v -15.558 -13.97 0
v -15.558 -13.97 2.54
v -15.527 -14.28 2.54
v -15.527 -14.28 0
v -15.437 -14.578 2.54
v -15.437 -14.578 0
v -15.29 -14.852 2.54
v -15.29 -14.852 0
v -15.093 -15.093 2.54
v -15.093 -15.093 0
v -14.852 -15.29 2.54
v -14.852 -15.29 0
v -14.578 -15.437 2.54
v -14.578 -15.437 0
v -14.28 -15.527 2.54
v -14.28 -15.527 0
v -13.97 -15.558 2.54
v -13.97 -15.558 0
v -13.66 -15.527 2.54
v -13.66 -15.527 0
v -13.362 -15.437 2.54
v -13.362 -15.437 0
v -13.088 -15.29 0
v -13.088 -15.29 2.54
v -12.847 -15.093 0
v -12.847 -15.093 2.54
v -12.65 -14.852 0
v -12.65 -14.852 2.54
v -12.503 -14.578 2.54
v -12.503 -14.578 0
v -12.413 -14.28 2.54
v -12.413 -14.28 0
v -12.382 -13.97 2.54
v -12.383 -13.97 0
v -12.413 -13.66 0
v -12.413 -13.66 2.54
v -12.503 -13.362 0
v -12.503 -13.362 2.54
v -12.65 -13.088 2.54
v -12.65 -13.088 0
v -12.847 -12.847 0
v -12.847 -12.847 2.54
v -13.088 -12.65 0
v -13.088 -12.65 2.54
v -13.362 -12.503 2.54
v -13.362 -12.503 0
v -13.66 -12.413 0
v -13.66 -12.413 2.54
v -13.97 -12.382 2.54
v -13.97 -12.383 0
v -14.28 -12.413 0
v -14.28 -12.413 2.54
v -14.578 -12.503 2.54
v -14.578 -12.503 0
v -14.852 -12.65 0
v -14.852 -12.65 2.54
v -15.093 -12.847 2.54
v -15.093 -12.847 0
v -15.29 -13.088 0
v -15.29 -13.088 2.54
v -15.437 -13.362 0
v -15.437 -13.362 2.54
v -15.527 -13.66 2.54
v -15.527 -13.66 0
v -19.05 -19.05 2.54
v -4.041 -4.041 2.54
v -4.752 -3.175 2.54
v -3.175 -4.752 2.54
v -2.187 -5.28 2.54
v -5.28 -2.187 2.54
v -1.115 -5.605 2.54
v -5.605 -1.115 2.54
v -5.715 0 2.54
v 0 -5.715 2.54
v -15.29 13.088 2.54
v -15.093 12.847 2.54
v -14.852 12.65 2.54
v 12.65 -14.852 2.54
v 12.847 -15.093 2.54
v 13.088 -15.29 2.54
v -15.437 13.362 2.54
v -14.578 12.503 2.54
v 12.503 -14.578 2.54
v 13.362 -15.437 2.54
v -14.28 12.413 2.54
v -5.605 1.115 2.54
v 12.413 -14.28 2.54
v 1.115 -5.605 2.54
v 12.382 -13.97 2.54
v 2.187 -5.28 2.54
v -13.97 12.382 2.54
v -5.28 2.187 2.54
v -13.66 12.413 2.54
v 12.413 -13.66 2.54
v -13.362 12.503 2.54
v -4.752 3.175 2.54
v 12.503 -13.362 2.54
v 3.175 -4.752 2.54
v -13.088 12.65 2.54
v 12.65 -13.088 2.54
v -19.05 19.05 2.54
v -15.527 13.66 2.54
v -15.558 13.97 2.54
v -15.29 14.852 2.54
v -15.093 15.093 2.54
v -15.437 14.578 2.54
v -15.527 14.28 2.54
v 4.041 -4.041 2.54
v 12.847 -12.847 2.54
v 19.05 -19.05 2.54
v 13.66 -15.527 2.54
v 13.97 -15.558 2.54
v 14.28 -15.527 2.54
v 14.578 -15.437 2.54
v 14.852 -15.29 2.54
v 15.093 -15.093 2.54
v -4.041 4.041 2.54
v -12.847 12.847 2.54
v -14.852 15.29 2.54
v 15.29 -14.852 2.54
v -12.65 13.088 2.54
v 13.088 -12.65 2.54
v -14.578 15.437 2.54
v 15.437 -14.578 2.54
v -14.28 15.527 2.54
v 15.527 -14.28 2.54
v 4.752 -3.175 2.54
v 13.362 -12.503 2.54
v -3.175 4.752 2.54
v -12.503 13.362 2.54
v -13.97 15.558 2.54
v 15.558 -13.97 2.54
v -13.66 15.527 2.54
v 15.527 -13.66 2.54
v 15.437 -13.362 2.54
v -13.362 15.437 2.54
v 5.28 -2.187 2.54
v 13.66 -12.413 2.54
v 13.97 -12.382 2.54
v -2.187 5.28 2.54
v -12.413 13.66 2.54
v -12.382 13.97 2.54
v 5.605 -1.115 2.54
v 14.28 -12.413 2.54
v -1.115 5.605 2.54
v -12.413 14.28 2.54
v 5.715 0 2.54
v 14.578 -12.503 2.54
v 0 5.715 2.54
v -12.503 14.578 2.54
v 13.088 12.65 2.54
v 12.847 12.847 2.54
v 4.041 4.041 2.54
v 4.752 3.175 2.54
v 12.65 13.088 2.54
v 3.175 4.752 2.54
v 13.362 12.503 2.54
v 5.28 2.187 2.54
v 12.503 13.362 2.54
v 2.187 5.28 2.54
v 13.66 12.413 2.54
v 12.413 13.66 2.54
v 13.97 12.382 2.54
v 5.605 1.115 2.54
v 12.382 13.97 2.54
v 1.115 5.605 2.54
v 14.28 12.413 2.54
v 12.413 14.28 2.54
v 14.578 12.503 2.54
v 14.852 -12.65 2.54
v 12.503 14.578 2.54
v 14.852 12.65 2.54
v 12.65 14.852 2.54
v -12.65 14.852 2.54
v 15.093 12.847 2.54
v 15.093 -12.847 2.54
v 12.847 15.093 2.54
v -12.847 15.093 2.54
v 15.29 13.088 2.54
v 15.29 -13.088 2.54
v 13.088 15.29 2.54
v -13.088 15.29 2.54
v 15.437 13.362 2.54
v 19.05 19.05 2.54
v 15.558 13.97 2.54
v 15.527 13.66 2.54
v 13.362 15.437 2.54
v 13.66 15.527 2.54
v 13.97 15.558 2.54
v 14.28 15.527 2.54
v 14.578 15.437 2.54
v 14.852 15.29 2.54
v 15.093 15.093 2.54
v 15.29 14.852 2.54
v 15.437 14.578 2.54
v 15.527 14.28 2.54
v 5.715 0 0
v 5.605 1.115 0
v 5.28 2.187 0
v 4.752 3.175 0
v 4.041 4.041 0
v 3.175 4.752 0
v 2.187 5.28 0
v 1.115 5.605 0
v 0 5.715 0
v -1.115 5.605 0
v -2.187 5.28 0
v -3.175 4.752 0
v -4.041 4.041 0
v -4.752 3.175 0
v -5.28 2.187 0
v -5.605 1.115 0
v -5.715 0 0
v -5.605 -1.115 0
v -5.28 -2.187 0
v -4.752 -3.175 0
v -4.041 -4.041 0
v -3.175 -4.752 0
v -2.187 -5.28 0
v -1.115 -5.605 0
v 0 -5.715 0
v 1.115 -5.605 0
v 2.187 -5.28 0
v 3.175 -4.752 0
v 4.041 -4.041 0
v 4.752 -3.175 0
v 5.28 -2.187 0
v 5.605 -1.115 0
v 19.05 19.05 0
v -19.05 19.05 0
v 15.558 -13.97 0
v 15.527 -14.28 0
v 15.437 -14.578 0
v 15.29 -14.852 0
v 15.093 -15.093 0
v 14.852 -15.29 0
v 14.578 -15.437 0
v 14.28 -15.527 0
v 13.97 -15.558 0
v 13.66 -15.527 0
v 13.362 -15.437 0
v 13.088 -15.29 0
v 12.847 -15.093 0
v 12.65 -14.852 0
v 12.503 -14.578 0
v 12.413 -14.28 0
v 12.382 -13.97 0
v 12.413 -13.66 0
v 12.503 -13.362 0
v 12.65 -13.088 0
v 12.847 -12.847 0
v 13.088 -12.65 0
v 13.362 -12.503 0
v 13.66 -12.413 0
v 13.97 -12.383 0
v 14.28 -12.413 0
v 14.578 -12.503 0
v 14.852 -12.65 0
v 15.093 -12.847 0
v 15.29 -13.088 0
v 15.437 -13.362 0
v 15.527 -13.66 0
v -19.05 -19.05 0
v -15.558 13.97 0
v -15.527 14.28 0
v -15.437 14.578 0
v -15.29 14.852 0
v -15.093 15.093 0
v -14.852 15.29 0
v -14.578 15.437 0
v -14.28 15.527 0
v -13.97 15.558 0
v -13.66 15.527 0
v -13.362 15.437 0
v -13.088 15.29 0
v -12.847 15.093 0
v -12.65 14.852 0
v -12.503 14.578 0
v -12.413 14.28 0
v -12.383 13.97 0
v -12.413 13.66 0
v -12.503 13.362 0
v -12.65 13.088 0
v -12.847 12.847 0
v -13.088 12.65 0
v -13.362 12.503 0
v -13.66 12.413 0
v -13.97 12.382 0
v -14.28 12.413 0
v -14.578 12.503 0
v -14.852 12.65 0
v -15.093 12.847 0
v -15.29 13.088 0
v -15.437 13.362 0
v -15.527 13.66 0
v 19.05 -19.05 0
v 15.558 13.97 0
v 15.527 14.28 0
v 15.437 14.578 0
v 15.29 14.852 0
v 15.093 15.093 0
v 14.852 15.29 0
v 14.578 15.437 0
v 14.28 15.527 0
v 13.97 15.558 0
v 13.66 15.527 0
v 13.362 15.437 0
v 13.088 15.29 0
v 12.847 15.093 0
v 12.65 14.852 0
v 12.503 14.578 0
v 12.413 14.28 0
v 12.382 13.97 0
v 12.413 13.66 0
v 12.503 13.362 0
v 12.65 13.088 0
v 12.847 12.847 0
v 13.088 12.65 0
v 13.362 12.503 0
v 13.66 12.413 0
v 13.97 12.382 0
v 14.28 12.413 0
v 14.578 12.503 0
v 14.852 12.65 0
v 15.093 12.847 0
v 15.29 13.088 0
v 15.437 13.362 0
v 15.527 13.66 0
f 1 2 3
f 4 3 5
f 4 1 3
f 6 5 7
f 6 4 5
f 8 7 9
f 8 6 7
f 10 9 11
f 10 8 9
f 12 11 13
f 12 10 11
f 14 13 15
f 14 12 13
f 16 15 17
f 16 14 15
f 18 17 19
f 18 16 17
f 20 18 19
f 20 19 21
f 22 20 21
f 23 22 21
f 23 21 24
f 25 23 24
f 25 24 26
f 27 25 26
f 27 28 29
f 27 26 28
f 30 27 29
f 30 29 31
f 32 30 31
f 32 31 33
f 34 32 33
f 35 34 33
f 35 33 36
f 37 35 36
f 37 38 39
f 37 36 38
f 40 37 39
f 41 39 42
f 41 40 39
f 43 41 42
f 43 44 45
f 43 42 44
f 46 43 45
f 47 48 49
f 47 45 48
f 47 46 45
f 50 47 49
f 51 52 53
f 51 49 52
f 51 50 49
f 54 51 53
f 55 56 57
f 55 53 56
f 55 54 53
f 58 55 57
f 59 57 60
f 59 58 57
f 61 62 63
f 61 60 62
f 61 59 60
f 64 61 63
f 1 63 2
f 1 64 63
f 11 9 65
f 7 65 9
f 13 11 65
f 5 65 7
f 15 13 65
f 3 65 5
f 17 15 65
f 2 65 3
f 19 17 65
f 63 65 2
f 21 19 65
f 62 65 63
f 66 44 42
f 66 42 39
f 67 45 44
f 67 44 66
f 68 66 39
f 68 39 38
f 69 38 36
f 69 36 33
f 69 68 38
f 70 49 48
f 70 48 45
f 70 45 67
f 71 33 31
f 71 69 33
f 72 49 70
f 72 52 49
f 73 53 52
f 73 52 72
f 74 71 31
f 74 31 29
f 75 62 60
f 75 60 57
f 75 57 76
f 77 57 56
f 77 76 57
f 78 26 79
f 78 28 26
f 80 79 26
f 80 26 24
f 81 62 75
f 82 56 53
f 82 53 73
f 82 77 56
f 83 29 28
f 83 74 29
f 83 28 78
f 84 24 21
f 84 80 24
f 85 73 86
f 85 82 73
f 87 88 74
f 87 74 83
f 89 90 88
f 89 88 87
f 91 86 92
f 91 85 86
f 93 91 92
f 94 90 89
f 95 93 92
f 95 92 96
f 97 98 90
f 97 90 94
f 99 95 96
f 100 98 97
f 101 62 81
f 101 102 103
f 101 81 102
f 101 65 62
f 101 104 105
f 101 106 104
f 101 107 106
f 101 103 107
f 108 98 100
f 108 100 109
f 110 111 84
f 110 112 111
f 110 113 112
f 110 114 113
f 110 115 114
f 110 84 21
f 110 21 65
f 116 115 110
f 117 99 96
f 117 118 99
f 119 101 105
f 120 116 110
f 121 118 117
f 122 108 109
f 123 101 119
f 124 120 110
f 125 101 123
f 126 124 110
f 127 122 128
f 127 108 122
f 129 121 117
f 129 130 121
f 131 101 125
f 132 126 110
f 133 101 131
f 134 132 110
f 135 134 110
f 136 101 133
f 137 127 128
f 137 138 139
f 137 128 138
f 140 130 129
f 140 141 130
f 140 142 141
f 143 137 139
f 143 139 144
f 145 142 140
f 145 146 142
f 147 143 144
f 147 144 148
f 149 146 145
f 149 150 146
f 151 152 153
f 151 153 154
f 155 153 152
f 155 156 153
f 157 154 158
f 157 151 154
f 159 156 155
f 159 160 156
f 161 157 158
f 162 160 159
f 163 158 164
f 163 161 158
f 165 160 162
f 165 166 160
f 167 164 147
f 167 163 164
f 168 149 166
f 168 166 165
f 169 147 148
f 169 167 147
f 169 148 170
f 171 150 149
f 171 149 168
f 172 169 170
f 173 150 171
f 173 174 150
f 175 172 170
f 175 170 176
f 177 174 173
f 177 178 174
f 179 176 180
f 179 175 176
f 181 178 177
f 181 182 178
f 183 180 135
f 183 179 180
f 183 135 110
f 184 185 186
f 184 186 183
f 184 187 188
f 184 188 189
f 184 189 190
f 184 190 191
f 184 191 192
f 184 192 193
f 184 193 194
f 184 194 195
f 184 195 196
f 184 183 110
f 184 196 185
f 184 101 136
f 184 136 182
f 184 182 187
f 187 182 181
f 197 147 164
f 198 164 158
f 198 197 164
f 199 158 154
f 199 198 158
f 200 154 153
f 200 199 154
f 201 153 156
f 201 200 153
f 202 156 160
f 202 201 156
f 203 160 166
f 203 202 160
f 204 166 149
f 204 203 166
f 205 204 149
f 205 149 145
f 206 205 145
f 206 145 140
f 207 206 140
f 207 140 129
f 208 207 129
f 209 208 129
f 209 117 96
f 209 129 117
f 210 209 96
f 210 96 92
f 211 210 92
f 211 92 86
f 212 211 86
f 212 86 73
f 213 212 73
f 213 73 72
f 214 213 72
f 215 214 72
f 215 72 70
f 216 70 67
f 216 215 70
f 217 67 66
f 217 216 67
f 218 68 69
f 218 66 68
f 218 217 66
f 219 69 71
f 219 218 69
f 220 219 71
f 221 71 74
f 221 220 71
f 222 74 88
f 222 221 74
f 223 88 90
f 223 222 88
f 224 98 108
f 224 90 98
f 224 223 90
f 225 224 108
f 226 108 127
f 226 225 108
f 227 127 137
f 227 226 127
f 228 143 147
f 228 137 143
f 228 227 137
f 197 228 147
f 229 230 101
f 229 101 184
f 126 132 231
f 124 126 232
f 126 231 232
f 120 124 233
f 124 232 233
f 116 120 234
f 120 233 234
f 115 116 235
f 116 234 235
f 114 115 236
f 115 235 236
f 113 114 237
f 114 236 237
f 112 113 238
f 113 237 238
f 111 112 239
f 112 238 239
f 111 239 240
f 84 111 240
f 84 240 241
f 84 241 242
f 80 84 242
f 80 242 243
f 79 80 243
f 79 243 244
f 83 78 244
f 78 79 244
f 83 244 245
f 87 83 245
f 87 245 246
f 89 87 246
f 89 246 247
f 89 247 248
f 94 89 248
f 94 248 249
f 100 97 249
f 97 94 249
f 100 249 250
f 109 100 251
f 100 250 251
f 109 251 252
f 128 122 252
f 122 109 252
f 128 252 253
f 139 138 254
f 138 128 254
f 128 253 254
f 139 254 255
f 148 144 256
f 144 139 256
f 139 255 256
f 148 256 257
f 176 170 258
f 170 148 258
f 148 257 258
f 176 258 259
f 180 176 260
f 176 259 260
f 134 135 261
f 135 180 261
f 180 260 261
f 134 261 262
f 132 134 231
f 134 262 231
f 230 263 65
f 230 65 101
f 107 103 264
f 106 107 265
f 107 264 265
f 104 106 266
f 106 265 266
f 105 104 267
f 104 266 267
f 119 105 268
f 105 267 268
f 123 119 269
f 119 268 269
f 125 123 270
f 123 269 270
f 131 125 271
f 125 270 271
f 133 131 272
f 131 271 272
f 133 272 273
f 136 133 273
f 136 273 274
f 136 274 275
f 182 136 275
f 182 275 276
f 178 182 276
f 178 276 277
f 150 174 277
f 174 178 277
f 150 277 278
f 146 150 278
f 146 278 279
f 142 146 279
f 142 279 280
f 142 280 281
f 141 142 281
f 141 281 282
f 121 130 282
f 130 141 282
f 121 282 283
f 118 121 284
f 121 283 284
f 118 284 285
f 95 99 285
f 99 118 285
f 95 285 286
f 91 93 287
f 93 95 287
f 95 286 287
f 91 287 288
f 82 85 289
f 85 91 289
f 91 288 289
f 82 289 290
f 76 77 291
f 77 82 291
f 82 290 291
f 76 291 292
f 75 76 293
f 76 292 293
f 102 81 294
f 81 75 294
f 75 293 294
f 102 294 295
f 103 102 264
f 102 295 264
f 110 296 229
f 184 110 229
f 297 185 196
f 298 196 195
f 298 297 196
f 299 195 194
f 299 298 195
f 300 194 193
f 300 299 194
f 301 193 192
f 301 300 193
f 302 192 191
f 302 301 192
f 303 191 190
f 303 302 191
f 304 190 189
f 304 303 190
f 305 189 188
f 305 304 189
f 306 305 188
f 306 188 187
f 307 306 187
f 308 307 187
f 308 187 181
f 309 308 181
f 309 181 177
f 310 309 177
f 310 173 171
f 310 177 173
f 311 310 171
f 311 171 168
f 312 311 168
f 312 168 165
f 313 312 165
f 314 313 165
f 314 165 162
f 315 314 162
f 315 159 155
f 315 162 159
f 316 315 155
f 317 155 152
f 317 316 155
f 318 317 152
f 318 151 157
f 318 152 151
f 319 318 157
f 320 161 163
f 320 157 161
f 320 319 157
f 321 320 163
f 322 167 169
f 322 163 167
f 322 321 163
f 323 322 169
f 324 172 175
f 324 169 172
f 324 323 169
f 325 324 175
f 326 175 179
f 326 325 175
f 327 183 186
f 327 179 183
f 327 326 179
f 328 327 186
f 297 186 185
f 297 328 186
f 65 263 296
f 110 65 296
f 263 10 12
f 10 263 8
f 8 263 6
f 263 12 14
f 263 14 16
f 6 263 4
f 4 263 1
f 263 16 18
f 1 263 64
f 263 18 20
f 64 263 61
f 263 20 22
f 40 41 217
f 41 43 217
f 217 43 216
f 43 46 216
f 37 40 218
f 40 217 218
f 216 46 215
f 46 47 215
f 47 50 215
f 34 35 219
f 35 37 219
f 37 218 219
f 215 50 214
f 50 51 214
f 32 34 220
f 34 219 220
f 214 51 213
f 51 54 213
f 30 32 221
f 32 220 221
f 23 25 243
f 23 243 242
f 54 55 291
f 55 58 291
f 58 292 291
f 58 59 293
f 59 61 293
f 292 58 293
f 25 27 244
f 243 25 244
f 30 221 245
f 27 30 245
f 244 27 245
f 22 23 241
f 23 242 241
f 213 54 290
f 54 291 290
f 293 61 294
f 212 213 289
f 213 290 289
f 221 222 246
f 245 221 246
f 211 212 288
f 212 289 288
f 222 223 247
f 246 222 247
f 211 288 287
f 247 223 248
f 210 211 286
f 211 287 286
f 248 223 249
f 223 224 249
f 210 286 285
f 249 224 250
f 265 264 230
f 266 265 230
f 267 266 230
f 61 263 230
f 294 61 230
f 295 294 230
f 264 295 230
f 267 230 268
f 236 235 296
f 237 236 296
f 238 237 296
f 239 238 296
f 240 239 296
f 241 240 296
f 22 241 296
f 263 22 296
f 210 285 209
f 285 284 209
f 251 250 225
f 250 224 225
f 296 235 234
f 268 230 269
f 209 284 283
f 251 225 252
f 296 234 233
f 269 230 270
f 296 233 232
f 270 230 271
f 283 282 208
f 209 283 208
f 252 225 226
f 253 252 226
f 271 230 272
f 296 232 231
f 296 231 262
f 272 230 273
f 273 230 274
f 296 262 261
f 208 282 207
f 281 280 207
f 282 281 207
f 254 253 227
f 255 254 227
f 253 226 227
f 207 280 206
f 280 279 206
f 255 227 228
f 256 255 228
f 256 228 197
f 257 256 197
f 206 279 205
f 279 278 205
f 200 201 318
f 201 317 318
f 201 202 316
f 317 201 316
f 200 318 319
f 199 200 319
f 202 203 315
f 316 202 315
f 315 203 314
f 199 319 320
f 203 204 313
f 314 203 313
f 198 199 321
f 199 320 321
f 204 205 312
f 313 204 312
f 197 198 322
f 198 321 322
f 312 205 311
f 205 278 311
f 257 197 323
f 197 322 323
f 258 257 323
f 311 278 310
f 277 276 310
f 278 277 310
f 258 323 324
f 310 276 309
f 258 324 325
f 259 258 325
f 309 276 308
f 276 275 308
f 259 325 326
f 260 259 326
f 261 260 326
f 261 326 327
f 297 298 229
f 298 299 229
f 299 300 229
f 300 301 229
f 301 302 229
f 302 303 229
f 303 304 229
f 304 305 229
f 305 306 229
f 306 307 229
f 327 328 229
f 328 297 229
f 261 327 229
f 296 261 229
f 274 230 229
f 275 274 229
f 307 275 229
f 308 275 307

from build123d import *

# Parameters (mm, degrees)
F0_W     = 38.1
F0_H     = 38.1
F1_DEPTH = 2.54
F2_R     = 5.715
F3_DEPTH = 25.4
F4_R     = 1.5875
F5_DEPTH = 25.4


with BuildPart() as f1:
    # F0 (on Top) → F1 (new body)
    with BuildSketch(Plane.XY):
        Rectangle(F0_W, F0_H)
    extrude(amount=F1_DEPTH)

    # F2 (on Top) → F3 (cut)
    with BuildSketch(Plane.XY):
        Circle(F2_R)
    extrude(amount=F3_DEPTH, mode=Mode.SUBTRACT)

    # F4 (on Top) → F5 (cut)
    with BuildSketch(Plane.XY):
        with Locations((13.97, 13.97)):
            Circle(F4_R)
    extrude(amount=F5_DEPTH, mode=Mode.SUBTRACT)

    # F6: F1 across plane


with BuildPart() as f1_1:
    add(f1.part)
    add(f1.part.mirror(Plane.YZ), mode=Mode.INTERSECT)

    # F7: F1 across plane


with BuildPart() as f1_2:
    add(f1_1.part)
    add(f1_1.part.mirror(Plane.XZ), mode=Mode.INTERSECT)


solid = f1_2.part
